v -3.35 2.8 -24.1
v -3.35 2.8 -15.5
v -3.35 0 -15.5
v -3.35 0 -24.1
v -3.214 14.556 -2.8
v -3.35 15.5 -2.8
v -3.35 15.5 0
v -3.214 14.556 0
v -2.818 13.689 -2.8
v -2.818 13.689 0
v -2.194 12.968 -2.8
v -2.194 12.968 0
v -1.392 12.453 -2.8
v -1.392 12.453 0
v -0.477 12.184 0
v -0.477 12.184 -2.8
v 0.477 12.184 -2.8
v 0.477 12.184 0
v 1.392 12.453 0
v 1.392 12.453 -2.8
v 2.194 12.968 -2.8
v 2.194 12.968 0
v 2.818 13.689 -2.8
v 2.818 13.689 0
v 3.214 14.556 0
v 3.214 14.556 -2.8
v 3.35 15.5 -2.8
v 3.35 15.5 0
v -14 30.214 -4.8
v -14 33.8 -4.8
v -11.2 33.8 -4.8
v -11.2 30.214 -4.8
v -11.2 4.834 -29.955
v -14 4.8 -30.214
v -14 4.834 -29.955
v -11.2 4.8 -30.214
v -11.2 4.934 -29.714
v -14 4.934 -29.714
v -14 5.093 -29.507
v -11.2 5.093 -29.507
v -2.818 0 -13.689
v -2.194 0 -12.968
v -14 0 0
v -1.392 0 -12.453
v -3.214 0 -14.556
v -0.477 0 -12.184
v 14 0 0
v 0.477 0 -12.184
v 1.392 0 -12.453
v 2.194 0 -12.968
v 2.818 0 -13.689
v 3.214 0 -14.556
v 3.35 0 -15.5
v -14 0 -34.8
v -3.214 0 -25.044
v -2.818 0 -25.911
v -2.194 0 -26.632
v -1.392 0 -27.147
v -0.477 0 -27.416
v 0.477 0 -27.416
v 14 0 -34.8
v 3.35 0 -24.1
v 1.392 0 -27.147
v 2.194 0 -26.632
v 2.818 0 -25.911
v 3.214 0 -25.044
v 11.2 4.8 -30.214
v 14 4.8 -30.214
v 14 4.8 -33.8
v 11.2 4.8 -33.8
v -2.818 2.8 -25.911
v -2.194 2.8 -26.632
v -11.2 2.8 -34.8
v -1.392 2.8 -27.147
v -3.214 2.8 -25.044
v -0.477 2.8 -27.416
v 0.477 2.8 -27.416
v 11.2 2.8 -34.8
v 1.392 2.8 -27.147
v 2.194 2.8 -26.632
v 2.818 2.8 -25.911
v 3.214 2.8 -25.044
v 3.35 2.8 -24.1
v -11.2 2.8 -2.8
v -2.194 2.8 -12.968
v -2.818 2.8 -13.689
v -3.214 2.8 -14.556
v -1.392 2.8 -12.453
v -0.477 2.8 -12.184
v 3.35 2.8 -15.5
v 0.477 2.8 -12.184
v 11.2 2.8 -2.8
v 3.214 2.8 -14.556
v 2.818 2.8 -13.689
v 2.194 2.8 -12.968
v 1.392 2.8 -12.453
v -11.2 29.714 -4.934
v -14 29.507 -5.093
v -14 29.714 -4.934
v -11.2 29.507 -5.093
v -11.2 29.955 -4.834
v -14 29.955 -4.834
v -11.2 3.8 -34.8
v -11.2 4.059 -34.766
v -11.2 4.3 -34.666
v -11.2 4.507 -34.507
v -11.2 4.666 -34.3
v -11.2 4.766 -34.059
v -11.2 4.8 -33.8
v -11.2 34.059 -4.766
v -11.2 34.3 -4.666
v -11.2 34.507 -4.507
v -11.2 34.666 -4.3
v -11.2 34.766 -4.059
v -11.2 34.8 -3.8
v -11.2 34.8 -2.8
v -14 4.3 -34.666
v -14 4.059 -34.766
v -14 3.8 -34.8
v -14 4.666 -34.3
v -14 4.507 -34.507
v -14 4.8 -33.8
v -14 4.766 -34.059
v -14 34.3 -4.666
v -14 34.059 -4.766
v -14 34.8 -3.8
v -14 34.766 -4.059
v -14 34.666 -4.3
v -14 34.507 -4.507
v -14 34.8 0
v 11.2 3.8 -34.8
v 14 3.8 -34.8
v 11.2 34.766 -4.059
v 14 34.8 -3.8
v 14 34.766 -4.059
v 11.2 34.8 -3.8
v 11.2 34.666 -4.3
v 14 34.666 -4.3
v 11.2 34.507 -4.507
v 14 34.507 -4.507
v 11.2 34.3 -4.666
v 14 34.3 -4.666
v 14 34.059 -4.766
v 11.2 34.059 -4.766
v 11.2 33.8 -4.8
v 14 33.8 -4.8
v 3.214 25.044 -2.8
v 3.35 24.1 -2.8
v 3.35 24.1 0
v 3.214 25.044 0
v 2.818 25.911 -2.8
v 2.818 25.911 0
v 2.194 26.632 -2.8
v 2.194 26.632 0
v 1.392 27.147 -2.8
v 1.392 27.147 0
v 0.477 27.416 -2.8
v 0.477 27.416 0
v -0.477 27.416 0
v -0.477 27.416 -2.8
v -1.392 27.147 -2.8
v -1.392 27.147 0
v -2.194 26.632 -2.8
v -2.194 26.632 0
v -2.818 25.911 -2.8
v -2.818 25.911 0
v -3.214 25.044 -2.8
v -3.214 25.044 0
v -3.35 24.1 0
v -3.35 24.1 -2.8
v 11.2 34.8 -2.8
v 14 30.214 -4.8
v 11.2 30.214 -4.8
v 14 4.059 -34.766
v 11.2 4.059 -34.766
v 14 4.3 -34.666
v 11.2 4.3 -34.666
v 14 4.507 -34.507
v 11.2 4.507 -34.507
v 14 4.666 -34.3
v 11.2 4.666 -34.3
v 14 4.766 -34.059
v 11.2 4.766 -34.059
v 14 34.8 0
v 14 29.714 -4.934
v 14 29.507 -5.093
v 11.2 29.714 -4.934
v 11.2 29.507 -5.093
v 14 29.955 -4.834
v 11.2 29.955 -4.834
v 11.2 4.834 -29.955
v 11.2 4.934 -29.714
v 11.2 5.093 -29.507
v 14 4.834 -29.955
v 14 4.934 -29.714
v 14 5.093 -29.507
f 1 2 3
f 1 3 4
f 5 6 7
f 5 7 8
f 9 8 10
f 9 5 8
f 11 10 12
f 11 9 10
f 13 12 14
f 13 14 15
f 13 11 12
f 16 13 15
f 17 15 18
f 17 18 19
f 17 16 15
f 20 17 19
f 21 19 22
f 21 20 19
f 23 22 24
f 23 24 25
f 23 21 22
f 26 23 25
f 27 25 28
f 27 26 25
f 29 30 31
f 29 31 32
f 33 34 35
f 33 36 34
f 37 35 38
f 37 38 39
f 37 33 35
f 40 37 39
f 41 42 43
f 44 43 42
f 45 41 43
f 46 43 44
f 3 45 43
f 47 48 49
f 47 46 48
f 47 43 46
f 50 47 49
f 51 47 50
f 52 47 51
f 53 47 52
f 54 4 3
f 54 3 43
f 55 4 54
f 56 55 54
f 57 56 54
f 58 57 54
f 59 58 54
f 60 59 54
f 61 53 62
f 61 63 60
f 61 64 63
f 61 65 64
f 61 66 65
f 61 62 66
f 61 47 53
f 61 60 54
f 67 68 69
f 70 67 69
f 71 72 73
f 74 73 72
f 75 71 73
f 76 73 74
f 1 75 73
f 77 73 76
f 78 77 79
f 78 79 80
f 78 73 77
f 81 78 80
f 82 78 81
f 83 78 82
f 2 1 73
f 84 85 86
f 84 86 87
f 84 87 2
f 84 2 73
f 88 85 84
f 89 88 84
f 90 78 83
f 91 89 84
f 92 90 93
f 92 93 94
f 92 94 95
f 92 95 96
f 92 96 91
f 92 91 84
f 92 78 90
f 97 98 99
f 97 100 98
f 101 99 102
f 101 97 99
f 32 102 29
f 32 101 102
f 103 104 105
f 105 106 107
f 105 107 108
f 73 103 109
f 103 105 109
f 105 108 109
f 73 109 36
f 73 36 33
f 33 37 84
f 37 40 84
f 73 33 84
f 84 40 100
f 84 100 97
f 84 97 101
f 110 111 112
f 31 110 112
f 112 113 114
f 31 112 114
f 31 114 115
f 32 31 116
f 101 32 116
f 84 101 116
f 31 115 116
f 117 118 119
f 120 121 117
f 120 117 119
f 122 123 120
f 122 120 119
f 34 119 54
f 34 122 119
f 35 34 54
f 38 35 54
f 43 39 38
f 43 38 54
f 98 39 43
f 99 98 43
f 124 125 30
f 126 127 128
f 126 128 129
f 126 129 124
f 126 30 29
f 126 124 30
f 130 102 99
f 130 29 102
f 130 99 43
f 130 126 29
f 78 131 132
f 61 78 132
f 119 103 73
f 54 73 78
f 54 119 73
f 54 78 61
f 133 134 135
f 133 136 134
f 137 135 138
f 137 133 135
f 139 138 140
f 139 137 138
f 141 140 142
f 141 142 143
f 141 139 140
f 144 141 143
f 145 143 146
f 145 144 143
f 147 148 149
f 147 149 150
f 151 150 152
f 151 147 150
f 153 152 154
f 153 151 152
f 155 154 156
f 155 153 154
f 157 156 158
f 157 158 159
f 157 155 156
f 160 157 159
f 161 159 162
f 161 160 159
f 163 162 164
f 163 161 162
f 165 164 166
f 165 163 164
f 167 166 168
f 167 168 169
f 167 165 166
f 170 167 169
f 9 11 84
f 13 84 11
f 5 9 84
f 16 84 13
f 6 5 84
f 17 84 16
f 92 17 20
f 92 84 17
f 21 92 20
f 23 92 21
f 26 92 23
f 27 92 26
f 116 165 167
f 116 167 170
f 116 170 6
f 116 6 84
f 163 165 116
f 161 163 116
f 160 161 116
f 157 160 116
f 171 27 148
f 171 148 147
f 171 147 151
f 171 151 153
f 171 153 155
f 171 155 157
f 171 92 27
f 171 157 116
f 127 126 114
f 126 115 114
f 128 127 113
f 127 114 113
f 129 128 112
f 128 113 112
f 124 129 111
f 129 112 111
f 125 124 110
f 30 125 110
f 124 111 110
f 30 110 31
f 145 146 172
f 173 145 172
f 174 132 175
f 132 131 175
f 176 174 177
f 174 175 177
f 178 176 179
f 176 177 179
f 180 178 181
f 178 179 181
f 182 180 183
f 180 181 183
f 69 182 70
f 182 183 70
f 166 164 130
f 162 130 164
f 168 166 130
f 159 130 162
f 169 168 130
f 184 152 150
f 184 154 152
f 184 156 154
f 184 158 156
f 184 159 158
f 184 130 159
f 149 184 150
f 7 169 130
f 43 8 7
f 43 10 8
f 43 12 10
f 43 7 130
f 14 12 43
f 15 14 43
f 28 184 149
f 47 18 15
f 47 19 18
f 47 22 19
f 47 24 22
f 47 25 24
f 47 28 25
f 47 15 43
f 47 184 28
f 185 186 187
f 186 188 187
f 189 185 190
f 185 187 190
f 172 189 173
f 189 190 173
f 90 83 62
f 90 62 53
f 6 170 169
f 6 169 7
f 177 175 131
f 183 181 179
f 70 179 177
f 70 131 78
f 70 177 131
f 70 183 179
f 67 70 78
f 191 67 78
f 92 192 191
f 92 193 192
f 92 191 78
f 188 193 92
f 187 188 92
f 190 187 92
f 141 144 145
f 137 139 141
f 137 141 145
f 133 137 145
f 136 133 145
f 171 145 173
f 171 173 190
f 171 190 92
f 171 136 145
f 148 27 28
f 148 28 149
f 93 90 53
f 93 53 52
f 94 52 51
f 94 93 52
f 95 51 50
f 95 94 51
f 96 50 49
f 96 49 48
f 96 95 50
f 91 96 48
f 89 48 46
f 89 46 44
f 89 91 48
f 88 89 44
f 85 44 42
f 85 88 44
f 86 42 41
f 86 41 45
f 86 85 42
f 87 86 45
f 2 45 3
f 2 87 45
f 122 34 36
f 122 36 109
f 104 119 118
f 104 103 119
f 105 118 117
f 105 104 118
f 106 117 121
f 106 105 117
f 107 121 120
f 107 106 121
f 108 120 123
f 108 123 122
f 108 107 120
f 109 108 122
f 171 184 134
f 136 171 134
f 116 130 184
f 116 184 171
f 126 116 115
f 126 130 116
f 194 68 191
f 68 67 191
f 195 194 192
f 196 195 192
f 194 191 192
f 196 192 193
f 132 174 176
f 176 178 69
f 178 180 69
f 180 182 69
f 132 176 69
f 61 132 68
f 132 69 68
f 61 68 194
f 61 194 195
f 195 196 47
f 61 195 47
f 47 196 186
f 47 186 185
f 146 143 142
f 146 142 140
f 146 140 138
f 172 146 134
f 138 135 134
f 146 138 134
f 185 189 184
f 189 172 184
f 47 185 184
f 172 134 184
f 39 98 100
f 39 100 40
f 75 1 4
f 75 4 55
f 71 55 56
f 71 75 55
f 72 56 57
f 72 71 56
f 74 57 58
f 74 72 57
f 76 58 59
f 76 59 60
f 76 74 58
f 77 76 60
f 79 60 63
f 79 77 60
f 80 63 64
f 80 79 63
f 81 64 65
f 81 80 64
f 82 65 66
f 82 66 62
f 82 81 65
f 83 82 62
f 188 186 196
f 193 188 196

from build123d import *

# Parameters (mm, degrees)
EXTRUDE_1_DEPTH     = 14
EXTRUDE_3_DEPTH     = 2.8
FILLET_1_R          = 1
CUT_EXTRUDE_1_DEPTH = 2.8
CUT_EXTRUDE_2_DEPTH = 2.8


with BuildPart() as part:
    # 草图1 → 凸台-拉伸1 (new body, symmetric)
    with BuildSketch(Plane(origin=(0, 0, 0), x_dir=(0, 0, -1), z_dir=(1, 0, 0))):
        Polygon((0, 34.8), (0, 0), (34.8, 0), (34.8, 2.8), (2.8, 2.8), (2.8, 34.8), align=None)
    extrude(amount=EXTRUDE_1_DEPTH, both=True)

    # 草图2 → 凸台-拉伸3 (add)
    with BuildSketch(Plane(origin=(14, 0, 0), x_dir=(0, 0, -1), z_dir=(1, 0, 0))):
        Polygon((2.8, 34.8), (4.8, 34.8), (4.8, 29.8), (29.8, 4.8), (34.8, 4.8), (34.8, 2.8), (2.8, 2.8), align=None)
    extrude_3 = extrude(amount=-EXTRUDE_3_DEPTH)

    # 镜向1: 凸台-拉伸3 across plane
    add(extrude_3.mirror(Plane(origin=(0, 0, 0), x_dir=(0, 0, 1), z_dir=(1, 0, 0))))

    # 圆角1
    fillet_1_edges = [part.edges().sort_by_distance(p)[0] for p in [
        (12.6, 34.8, -4.8),
        (12.6, 29.8, -4.8),
        (12.6, 4.8, -29.8),
        (12.6, 4.8, -34.8),
        (-12.6, 4.8, -34.8),
        (-12.6, 4.8, -29.8),
        (-12.6, 29.8, -4.8),
        (-12.6, 34.8, -4.8),
    ]]
    fillet(fillet_1_edges, radius=FILLET_1_R)

    # 草图3 → 切除-拉伸1 (cut)
    with BuildSketch(Plane(origin=(0, 2.8, 0), x_dir=(1, 0, 0), z_dir=(0, 1, 0))):
        with BuildLine():
            Line((-3.35, 15.5), (-3.35, 24.1))
            ThreePointArc((-3.35, 24.1), (0, 27.45), (3.35, 24.1))
            Line((3.35, 24.1), (3.35, 15.5))
            ThreePointArc((3.35, 15.5), (0, 12.15), (-3.35, 15.5))
        make_face()
    extrude(amount=-CUT_EXTRUDE_1_DEPTH, mode=Mode.SUBTRACT)

    # 草图4 → 切除-拉伸2 (cut)
    with BuildSketch(Plane(origin=(0, 0, -2.8), x_dir=(-1, 0, 0), z_dir=(0, 0, -1))):
        with BuildLine():
            Line((-3.35, 15.5), (-3.35, 24.1))
            ThreePointArc((-3.35, 24.1), (0, 27.45), (3.35, 24.1))
            Line((3.35, 24.1), (3.35, 15.5))
            ThreePointArc((3.35, 15.5), (0, 12.15), (-3.35, 15.5))
        make_face()
    extrude(amount=-CUT_EXTRUDE_2_DEPTH, mode=Mode.SUBTRACT)


solid = part.part
